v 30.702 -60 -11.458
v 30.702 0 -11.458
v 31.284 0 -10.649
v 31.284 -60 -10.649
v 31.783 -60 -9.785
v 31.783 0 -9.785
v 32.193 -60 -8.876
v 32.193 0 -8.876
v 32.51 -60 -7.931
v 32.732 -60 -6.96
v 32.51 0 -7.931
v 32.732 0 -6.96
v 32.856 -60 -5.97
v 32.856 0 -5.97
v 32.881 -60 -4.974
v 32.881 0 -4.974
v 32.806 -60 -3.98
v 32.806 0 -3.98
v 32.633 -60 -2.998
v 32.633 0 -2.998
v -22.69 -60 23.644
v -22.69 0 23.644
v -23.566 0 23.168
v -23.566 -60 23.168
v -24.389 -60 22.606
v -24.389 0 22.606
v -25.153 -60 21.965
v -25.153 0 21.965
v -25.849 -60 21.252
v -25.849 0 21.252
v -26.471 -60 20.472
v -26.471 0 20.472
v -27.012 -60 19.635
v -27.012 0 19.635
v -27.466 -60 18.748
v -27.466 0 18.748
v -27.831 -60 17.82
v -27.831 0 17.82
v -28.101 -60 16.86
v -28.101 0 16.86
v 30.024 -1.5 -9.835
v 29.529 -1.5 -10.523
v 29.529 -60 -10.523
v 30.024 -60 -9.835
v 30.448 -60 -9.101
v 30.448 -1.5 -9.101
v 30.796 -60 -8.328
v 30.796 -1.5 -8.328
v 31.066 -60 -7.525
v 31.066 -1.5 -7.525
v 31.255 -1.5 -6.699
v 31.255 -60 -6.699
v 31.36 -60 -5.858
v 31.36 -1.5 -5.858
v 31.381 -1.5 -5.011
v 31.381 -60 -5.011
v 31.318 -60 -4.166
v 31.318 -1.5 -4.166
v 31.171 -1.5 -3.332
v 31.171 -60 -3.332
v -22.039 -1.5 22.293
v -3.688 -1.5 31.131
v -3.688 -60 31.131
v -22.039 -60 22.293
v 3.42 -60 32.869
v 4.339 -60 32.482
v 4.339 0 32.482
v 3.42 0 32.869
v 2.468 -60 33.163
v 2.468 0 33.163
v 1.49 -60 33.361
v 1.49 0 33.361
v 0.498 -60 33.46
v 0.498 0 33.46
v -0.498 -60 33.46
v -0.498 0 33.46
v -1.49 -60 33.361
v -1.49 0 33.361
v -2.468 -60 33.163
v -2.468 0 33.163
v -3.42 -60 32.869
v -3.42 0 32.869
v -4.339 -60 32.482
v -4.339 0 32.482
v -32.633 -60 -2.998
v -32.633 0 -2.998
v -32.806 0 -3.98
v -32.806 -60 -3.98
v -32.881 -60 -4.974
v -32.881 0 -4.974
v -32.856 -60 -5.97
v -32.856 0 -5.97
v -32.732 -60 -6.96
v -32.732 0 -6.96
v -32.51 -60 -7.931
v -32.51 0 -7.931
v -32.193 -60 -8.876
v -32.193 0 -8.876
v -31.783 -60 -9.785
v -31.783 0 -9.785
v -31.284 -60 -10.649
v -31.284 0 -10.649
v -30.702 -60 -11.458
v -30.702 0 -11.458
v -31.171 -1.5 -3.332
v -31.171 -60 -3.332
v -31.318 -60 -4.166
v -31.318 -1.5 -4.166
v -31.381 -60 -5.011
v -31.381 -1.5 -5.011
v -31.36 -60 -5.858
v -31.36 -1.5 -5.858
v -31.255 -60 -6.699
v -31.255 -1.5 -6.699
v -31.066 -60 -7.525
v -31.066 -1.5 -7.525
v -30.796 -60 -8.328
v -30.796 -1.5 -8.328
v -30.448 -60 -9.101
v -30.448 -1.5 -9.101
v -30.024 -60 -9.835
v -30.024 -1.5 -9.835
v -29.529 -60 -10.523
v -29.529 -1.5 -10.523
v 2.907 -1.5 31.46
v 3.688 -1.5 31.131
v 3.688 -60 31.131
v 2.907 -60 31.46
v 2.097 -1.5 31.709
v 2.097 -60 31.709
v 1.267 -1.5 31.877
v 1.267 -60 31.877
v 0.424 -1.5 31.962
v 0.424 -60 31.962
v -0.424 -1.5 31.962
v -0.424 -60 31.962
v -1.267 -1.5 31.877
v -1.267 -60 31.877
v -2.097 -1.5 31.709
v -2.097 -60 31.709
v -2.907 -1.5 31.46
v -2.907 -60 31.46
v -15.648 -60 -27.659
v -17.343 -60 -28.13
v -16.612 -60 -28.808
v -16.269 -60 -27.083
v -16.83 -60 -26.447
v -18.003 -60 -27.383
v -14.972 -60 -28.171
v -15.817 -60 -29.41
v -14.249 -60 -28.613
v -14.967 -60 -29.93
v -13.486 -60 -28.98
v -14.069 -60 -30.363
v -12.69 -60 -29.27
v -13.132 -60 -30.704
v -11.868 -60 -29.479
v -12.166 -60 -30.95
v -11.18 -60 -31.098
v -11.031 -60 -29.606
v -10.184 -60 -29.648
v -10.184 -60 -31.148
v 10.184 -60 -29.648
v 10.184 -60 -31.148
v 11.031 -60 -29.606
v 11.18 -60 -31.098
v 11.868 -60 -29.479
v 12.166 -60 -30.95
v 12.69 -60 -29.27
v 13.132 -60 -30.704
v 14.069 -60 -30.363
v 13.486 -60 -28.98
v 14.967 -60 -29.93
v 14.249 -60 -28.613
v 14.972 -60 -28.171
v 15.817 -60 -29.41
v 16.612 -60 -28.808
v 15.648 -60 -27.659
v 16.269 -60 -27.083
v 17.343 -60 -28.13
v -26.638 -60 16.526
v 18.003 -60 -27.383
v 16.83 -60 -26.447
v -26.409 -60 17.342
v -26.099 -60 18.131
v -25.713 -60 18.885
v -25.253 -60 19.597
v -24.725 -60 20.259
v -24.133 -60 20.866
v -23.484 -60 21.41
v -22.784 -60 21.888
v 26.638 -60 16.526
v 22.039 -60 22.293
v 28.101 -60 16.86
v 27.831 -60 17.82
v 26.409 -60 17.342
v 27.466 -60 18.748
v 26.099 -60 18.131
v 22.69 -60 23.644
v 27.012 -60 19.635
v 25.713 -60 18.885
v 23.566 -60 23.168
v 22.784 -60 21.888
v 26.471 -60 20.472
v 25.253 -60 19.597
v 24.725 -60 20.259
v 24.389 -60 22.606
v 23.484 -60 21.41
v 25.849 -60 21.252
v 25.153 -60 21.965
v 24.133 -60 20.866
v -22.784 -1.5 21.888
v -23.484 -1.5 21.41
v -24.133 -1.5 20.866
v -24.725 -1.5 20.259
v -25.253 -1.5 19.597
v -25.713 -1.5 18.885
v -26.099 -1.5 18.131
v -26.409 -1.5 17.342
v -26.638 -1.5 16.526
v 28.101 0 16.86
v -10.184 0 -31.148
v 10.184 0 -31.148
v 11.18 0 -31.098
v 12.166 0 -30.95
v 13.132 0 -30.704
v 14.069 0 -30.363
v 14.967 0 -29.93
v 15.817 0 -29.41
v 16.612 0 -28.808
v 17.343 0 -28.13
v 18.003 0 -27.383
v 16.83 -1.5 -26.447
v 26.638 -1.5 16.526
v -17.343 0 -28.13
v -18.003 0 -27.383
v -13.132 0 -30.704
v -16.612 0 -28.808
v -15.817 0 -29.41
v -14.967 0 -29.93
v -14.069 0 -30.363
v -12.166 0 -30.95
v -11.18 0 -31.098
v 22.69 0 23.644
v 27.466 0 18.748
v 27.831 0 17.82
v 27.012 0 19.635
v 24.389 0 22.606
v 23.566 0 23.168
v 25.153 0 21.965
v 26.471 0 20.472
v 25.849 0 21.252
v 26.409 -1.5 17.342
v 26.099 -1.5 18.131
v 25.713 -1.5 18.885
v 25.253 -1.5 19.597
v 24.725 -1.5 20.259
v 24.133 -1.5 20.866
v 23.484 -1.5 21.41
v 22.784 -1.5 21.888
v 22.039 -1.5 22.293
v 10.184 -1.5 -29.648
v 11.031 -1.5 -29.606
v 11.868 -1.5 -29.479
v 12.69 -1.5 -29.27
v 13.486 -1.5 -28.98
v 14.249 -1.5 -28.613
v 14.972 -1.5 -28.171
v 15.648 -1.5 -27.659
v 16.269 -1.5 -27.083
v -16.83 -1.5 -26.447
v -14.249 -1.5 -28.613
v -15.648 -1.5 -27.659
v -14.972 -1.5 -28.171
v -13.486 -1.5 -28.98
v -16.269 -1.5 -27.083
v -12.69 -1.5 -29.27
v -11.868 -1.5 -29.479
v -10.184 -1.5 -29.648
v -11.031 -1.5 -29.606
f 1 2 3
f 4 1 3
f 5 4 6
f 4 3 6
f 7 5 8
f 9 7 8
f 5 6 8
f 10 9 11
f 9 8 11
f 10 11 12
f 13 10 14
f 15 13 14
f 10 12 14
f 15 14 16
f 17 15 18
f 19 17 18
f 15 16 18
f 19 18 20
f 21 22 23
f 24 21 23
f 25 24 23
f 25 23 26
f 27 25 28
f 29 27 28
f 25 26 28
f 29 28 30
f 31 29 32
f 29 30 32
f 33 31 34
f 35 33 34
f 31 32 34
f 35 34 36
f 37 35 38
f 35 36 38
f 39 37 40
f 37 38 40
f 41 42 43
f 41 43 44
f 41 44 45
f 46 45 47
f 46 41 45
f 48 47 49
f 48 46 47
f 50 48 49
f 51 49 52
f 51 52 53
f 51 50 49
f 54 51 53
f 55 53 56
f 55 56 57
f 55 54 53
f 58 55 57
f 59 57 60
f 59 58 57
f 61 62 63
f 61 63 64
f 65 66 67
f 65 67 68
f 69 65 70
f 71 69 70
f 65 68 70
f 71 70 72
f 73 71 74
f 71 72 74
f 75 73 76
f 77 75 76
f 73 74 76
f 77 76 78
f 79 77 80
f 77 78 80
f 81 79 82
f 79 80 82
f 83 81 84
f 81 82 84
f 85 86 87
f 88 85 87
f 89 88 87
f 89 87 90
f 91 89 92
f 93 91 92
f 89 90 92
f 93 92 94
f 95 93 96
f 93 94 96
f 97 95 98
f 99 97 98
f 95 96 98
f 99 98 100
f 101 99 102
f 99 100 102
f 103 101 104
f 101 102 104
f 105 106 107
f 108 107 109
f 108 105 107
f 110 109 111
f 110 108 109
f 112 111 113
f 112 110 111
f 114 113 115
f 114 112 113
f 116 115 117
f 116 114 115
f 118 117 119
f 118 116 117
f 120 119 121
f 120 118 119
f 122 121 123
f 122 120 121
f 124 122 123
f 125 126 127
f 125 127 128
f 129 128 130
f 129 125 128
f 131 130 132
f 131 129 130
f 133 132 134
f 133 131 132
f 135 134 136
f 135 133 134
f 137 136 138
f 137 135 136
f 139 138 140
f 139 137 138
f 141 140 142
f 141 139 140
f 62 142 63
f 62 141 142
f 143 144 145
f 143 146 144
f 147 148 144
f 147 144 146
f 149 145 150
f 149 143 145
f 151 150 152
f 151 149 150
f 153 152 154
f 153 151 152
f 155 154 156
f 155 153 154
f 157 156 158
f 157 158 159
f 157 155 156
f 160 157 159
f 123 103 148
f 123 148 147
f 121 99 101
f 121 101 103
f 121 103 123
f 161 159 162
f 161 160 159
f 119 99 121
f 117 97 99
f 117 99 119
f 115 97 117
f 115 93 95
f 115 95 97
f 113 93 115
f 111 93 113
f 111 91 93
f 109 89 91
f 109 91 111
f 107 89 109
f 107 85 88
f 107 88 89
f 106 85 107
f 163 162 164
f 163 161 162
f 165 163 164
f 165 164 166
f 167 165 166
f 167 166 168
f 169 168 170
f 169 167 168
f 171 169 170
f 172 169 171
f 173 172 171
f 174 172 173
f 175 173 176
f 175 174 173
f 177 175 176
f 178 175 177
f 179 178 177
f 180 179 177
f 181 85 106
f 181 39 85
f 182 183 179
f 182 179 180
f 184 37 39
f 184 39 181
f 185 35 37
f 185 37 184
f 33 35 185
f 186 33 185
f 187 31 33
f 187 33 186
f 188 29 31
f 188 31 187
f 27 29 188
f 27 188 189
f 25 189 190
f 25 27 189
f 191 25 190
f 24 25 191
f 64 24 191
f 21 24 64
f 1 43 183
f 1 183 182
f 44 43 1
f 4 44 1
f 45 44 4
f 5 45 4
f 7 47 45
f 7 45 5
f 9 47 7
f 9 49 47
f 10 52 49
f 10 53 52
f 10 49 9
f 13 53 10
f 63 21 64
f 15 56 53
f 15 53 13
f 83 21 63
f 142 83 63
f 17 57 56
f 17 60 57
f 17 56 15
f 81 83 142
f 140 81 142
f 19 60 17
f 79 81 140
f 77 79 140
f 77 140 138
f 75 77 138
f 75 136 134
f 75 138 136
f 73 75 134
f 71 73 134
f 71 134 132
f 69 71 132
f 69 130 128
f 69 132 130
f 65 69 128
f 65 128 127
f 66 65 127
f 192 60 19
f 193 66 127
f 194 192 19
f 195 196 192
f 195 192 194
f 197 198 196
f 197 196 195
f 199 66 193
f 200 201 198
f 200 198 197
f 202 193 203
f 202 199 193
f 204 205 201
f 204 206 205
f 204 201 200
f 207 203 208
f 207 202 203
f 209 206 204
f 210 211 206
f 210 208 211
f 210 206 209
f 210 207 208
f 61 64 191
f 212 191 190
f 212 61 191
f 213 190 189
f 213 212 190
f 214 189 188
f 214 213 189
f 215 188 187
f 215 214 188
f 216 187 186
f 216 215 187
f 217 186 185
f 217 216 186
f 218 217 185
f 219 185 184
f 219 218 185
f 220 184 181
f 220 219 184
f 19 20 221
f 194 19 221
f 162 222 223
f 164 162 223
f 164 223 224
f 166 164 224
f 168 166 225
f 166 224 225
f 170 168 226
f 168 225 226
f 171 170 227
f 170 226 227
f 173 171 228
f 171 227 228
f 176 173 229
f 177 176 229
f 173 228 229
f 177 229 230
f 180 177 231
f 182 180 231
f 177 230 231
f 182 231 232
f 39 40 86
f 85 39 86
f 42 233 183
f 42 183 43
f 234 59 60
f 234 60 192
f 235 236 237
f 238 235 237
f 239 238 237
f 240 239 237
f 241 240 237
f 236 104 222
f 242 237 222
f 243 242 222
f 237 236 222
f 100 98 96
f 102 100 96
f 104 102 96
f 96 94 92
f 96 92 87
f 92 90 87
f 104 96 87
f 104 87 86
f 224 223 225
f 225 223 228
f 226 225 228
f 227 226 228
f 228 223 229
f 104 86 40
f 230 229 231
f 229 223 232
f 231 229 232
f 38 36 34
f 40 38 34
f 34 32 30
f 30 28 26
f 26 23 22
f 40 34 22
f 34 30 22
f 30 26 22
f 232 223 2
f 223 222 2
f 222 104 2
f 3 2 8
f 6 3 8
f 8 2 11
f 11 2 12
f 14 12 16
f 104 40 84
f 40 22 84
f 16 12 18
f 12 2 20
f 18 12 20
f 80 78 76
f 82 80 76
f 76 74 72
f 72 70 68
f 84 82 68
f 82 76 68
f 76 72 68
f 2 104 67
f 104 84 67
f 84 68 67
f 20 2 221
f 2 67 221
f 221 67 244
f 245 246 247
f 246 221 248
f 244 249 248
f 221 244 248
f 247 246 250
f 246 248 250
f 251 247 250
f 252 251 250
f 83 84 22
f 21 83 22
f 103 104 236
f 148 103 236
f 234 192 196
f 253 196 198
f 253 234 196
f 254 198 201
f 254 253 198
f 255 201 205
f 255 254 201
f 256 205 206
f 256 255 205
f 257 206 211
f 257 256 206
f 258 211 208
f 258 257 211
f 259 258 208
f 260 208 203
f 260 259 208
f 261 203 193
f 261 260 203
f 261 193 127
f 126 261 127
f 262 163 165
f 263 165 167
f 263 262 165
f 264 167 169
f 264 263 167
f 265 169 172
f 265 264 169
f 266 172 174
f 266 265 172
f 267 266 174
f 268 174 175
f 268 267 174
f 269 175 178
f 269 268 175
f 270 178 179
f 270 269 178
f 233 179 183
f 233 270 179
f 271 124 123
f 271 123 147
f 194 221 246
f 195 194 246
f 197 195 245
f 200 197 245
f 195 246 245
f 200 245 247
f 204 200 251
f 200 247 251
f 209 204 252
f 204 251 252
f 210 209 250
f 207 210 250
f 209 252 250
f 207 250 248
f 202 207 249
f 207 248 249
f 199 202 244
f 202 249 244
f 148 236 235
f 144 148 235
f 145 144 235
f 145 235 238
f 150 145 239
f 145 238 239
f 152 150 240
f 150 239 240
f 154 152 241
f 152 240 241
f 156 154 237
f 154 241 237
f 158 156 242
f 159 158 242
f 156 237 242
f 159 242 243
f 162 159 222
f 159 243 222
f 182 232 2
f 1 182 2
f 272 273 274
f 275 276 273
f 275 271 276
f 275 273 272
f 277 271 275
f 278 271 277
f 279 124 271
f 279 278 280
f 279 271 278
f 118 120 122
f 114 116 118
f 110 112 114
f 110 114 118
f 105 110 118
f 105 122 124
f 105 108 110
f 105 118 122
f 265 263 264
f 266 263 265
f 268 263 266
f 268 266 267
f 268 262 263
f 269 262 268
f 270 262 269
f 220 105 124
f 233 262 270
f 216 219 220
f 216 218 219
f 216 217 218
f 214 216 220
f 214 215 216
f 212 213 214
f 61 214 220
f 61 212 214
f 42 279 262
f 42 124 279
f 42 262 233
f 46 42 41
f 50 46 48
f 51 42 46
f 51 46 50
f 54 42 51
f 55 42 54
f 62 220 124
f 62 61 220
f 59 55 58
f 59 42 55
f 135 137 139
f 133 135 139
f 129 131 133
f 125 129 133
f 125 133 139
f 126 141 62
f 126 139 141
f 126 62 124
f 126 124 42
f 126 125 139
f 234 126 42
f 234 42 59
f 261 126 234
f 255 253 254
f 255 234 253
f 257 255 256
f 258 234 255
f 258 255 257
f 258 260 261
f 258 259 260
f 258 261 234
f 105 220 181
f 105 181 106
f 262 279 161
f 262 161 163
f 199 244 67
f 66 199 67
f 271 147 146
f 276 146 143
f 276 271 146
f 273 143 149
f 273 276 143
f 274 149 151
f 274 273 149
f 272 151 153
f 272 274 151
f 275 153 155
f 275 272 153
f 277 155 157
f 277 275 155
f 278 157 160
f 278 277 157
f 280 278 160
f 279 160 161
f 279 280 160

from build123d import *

# Parameters (mm, degrees)
F1_DEPTH = 60
F2_T     = -1.5


with BuildPart() as f1:
    # F0 (on Front) → F1 (new body)
    with BuildSketch(Plane.XZ):
        with BuildLine():
            Line((22.690229, 23.644435), (4.338837, 32.481999))
            ThreePointArc((4.338837, 32.481999), (0, 33.47231), (-4.338837, 32.481999))
            Line((-4.338837, 32.481999), (-22.690229, 23.644435))
            ThreePointArc((-22.690229, 23.644435), (-26.169706, 20.869644), (-28.10067, 16.859956))
            Line((-28.10067, 16.859956), (-32.63309, -2.997871))
            ThreePointArc((-32.63309, -2.997871), (-32.63309, -7.44829), (-30.702125, -11.457978))
            Line((-30.702125, -11.457978), (-18.002569, -27.382719))
            ThreePointArc((-18.002569, -27.382719), (-14.523091, -30.15751), (-10.184254, -31.147821))
            Line((-10.184254, -31.147821), (10.184254, -31.147821))
            ThreePointArc((10.184254, -31.147821), (14.523091, -30.15751), (18.002569, -27.382719))
            Line((18.002569, -27.382719), (30.702125, -11.457978))
            ThreePointArc((30.702125, -11.457978), (32.63309, -7.44829), (32.63309, -2.997871))
            Line((32.63309, -2.997871), (28.10067, 16.859956))
            ThreePointArc((28.10067, 16.859956), (26.169706, 20.869644), (22.690229, 23.644435))
        make_face()
    extrude(amount=F1_DEPTH)

    # F2
    f2_openings = [f1.faces().sort_by_distance(p)[0] for p in [
        (0, -60, 0),
    ]]
    offset(amount=F2_T, openings=f2_openings)


solid = f1.part
